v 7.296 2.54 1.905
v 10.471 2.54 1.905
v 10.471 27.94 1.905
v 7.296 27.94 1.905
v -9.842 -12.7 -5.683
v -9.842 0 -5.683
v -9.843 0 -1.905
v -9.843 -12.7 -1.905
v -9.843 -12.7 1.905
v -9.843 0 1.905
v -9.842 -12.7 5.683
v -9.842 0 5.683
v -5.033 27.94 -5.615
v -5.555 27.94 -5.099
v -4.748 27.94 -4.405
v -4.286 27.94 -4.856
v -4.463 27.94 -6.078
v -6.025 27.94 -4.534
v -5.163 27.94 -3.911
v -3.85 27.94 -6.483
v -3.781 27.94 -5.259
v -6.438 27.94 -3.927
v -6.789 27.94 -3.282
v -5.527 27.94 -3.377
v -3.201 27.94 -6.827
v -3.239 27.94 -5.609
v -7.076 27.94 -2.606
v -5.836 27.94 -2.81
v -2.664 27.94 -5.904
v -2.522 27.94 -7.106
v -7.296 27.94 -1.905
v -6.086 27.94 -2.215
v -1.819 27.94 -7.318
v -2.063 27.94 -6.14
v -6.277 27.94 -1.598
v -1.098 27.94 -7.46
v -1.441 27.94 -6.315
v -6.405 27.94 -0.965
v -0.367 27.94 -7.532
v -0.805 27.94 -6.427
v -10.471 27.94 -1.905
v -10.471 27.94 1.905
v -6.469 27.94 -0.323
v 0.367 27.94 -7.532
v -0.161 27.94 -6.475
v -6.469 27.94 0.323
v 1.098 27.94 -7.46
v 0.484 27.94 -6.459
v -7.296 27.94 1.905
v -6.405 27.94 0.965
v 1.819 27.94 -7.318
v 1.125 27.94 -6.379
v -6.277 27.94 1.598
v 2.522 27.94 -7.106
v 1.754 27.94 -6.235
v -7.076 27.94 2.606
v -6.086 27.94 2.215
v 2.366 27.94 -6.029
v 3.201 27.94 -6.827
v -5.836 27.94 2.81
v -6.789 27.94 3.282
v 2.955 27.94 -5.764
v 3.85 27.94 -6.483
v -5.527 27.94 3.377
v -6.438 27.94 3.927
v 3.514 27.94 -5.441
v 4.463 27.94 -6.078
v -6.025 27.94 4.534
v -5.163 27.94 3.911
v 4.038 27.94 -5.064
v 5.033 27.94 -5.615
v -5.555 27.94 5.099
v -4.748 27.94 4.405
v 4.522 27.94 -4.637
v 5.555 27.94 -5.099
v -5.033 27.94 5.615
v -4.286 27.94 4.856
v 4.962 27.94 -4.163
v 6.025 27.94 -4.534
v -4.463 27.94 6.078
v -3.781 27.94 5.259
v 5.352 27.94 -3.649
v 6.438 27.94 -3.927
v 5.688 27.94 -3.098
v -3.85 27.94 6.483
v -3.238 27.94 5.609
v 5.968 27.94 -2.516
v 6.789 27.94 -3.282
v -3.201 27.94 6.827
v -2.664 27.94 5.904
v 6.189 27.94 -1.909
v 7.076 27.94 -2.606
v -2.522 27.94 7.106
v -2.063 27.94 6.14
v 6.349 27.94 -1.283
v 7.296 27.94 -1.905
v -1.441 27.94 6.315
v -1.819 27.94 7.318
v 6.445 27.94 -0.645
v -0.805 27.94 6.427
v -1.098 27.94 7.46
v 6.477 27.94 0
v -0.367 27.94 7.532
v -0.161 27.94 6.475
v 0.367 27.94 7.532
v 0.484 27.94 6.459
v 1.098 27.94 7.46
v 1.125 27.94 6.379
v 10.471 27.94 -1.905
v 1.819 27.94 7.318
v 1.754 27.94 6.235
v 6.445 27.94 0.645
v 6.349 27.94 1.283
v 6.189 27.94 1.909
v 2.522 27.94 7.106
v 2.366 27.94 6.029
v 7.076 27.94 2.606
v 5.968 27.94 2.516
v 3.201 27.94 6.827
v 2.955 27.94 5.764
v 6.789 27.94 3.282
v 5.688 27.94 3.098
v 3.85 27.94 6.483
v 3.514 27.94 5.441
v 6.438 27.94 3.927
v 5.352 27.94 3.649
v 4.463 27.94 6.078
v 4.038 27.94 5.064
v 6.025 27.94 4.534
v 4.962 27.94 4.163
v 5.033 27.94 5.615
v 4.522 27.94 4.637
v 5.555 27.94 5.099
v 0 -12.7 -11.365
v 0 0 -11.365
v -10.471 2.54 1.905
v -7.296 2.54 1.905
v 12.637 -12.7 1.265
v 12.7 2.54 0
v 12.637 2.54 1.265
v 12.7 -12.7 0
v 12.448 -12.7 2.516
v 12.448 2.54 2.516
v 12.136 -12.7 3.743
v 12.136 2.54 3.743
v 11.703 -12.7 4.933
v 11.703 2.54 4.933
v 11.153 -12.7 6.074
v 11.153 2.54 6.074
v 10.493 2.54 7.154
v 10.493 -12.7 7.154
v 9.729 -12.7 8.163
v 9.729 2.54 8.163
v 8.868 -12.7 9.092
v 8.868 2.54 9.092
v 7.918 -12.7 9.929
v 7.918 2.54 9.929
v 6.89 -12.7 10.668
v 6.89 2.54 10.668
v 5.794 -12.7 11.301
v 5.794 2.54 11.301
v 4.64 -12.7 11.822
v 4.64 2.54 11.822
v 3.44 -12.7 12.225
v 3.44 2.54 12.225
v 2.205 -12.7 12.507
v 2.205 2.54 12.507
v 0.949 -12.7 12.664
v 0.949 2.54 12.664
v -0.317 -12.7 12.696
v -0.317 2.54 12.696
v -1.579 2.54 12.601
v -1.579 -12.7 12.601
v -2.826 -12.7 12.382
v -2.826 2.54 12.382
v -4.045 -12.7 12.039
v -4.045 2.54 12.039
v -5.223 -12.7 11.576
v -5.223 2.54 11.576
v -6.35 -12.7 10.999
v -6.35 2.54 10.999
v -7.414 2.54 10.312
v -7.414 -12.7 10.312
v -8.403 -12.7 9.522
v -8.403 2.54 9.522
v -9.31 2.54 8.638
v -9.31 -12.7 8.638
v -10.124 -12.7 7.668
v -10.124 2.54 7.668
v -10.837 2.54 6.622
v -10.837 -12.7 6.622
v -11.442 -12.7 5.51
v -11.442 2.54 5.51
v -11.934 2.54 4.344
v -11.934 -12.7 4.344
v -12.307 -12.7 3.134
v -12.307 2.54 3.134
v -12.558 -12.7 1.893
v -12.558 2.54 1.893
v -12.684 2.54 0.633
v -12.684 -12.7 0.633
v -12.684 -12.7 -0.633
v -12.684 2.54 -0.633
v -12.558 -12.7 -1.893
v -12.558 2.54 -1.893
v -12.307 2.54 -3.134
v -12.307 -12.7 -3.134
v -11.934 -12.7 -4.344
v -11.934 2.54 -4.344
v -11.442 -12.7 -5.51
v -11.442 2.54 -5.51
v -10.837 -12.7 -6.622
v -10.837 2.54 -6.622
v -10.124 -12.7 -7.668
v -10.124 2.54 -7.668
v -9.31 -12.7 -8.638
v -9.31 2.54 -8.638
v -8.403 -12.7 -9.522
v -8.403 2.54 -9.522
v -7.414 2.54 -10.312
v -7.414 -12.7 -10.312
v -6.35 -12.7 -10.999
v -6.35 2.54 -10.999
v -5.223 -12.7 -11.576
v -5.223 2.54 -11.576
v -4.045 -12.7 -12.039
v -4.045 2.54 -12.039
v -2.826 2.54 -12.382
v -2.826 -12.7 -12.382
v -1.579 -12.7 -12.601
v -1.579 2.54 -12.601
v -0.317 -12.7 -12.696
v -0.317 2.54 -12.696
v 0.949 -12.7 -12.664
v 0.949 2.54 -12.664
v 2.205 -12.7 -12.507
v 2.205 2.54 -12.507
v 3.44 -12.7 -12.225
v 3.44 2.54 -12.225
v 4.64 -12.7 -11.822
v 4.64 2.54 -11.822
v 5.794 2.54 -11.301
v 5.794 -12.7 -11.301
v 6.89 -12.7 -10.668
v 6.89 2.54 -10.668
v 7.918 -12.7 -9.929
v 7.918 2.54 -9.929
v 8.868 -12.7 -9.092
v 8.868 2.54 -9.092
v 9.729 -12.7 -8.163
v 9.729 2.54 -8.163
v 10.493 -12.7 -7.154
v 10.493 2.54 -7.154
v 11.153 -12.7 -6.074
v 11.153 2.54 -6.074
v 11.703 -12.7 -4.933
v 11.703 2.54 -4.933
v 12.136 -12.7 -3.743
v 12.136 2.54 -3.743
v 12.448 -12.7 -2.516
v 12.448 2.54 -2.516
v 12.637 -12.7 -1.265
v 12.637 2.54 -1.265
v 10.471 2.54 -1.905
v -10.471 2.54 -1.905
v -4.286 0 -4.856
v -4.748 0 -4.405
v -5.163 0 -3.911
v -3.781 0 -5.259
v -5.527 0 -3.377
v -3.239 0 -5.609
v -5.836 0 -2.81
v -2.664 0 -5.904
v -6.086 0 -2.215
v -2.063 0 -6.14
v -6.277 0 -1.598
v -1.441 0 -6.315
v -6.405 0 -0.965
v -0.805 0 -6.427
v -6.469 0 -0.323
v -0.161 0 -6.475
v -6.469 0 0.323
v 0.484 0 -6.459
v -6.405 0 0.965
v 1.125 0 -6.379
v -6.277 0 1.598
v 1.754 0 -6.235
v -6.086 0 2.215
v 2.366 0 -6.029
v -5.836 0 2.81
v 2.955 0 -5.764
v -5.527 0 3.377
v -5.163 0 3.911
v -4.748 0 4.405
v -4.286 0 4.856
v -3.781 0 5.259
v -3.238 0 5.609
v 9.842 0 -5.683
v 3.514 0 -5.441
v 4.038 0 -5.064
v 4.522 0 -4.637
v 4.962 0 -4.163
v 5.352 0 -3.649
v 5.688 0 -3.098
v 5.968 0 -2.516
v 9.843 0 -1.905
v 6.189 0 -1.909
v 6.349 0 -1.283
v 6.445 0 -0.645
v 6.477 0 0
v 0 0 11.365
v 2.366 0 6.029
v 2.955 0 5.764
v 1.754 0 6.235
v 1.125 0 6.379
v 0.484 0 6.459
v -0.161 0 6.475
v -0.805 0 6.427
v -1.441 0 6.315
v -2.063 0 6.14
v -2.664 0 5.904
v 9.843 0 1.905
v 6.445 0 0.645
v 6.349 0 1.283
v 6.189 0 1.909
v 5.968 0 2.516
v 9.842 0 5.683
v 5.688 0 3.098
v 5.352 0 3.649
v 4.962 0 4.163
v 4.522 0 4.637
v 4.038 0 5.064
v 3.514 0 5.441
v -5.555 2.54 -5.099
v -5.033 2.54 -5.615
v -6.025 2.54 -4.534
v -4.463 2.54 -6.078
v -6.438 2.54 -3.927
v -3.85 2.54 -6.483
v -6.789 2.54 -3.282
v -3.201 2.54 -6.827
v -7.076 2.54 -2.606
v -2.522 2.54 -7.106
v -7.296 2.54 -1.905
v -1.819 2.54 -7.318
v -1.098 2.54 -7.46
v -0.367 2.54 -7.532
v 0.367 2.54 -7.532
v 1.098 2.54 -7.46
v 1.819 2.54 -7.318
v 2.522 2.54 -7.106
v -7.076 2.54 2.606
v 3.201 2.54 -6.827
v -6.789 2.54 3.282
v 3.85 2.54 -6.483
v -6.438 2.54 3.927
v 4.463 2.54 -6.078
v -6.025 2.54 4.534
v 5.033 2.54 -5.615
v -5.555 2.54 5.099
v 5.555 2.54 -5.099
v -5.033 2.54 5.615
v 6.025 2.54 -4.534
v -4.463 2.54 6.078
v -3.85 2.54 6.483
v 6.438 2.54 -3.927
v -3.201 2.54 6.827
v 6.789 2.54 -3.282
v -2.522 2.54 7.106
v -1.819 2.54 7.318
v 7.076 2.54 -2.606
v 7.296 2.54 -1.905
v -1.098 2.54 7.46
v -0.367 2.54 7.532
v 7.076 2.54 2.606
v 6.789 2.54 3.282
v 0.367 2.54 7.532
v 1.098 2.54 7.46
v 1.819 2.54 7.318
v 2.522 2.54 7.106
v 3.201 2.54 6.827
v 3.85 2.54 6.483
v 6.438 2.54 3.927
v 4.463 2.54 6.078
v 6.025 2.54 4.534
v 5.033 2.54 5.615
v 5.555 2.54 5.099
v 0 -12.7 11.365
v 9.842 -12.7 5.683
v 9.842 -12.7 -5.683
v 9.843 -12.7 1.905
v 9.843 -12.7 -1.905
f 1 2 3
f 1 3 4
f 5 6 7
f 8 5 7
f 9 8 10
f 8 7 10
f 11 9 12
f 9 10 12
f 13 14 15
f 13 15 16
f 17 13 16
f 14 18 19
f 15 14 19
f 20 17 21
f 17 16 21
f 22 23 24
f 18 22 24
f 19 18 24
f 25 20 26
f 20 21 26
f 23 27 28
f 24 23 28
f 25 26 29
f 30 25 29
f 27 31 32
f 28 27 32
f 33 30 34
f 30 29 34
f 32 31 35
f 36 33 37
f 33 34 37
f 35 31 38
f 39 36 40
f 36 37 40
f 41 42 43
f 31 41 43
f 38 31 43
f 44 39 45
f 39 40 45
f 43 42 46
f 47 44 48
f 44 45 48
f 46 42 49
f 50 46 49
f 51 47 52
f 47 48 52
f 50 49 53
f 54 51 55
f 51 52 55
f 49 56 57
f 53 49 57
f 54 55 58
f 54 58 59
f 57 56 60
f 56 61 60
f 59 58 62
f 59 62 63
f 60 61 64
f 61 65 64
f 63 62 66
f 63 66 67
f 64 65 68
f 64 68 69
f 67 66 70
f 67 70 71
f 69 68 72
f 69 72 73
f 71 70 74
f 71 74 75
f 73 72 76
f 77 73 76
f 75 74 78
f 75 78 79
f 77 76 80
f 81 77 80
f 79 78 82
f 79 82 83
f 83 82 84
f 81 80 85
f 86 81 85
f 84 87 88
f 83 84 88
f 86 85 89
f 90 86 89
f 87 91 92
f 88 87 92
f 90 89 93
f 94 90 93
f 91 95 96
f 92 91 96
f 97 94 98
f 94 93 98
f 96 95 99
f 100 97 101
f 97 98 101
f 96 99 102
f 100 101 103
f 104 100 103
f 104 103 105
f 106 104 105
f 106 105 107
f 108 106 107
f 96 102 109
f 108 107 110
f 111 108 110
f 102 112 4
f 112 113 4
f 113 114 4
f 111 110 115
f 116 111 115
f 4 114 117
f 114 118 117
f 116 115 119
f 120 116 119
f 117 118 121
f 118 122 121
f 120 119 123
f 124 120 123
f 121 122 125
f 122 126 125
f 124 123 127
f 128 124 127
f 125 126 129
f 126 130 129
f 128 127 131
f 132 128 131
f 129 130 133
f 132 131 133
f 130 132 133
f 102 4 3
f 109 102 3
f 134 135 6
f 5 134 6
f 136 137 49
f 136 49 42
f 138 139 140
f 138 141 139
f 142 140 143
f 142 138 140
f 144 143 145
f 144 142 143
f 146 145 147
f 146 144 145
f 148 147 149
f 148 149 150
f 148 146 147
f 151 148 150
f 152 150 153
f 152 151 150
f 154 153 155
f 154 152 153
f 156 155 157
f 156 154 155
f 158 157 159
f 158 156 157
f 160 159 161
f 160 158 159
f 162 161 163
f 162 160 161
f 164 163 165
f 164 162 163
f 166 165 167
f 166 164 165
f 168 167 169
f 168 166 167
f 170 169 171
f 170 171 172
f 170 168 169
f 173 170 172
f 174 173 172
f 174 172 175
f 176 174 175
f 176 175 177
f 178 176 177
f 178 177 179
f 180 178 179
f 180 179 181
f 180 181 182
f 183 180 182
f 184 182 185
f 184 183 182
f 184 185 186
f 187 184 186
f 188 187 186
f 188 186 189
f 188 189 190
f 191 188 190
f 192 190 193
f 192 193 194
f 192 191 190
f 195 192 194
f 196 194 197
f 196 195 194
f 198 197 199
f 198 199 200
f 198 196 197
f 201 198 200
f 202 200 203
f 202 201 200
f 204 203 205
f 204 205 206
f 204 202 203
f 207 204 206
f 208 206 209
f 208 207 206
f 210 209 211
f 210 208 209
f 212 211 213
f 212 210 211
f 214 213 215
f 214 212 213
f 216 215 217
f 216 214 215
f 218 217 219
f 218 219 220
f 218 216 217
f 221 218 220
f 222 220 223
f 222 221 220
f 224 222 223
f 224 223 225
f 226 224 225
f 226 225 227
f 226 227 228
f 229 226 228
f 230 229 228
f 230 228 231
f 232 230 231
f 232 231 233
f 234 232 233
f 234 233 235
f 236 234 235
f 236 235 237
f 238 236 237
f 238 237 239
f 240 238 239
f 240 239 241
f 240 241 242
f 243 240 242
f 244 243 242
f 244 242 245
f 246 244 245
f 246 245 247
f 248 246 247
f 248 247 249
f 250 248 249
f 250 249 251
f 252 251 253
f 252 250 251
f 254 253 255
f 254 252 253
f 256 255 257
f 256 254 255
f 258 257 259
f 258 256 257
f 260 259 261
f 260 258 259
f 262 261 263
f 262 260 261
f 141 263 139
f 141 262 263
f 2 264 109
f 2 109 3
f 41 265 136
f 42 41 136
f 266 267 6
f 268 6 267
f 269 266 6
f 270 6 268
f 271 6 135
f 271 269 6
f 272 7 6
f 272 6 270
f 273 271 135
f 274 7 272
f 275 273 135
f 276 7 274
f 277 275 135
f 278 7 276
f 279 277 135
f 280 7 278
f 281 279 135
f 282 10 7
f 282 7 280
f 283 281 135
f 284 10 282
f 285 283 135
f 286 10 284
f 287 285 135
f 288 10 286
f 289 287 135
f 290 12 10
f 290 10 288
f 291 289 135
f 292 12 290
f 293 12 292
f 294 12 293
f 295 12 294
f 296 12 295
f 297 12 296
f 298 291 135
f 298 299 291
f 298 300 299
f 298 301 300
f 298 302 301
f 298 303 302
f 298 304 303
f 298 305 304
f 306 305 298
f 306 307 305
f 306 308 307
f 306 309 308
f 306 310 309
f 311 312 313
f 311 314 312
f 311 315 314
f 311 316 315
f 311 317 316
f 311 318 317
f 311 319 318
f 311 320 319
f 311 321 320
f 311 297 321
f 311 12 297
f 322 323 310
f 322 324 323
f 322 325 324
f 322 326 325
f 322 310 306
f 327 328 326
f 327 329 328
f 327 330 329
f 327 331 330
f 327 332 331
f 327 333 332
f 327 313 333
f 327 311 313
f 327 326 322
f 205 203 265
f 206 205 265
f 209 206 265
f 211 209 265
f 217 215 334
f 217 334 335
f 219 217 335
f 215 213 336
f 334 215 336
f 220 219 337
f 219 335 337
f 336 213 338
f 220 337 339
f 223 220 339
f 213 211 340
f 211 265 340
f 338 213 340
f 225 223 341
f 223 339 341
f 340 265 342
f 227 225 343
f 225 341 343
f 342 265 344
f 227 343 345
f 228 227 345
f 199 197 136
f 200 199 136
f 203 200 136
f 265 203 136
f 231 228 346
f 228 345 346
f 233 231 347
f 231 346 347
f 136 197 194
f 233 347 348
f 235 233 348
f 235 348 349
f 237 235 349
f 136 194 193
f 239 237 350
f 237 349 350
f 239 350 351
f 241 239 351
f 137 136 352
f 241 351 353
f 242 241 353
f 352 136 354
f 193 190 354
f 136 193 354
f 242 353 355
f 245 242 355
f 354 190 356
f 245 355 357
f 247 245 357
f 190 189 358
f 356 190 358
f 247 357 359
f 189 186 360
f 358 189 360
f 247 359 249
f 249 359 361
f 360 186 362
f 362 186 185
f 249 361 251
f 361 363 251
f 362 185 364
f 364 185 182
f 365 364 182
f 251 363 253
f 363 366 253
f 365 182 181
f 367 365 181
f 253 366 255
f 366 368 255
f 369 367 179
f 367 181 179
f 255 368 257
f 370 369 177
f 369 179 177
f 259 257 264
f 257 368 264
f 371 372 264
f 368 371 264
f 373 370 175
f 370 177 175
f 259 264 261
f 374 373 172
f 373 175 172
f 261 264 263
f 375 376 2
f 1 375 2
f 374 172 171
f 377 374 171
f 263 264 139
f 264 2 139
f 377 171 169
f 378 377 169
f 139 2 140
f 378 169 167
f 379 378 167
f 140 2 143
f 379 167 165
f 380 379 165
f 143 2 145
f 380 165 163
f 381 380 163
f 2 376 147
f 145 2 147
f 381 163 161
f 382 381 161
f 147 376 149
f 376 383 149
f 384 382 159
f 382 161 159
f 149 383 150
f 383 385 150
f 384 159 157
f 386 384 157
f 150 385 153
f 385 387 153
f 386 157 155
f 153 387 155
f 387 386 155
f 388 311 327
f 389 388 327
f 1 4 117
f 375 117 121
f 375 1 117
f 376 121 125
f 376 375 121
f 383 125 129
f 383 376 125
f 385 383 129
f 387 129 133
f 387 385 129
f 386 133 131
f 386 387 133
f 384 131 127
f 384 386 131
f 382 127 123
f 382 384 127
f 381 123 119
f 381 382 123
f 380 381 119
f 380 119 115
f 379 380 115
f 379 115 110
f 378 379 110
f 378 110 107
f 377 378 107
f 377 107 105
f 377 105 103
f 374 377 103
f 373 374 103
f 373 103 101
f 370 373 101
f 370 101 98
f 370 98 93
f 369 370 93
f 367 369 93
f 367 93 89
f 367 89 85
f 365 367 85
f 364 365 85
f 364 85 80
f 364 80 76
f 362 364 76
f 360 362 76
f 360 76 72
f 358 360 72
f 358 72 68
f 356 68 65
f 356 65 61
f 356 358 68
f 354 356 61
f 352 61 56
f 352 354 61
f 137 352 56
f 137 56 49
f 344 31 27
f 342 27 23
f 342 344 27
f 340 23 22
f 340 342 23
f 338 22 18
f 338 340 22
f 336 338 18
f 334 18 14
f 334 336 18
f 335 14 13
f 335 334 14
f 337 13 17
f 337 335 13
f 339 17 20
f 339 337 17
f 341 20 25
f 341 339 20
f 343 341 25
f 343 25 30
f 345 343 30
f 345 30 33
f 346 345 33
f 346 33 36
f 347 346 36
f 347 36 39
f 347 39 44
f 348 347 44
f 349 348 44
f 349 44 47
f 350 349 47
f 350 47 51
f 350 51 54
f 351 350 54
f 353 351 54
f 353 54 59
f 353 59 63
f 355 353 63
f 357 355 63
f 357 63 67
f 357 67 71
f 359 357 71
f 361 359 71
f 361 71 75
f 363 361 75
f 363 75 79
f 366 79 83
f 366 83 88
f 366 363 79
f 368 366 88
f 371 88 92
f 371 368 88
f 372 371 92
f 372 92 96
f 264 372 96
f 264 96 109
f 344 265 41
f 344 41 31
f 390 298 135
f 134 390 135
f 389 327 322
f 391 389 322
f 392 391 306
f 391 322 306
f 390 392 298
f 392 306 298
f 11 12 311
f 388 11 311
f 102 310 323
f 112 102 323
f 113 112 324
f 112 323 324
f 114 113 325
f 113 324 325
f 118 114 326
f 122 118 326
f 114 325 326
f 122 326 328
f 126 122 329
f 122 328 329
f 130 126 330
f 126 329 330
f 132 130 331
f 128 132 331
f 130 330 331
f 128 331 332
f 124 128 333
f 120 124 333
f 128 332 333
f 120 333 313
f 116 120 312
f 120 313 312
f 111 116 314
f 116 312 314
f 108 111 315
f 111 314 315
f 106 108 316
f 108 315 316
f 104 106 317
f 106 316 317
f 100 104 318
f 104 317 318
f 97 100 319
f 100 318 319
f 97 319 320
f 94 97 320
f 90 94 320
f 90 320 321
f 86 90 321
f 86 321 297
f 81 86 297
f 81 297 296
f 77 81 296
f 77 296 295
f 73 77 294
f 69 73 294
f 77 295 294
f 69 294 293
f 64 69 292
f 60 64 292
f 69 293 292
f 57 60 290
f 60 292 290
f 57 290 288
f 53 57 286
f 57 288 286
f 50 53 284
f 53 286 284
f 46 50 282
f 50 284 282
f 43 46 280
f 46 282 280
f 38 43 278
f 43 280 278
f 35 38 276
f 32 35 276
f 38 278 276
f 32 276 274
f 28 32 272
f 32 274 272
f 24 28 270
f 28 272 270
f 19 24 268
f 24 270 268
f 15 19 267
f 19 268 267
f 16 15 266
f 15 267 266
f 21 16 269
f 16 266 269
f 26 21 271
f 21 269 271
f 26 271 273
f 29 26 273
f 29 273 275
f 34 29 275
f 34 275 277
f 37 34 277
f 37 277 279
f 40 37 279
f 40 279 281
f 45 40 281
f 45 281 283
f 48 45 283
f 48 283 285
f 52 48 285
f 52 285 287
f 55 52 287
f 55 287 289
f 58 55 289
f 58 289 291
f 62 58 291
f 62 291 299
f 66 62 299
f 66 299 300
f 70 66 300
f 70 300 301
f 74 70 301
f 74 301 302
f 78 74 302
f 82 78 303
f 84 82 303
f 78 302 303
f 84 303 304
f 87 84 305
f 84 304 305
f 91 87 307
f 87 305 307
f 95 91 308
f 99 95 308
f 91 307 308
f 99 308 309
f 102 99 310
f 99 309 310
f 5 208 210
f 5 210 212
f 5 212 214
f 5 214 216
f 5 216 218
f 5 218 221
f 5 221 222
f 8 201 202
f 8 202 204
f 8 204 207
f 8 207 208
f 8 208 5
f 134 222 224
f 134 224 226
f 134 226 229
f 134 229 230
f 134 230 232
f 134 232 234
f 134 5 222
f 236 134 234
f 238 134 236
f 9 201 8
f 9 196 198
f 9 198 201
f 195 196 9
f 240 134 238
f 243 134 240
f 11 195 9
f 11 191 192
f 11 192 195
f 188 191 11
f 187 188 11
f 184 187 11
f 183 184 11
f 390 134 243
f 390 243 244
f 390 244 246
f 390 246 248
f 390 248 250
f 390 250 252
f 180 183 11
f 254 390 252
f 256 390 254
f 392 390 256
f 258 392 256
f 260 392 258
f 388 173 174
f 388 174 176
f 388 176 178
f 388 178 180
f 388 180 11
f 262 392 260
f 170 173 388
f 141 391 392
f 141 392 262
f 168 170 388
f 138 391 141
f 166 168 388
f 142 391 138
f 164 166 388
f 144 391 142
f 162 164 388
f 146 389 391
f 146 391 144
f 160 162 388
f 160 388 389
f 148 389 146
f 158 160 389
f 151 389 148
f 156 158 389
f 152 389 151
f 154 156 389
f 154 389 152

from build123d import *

# Parameters (mm, degrees)
F0_R     = 12.7
F0_W     = 0.6285263425
F0_H     = 3.81
F1_DEPTH = 12.7
F2_DEPTH = 2.54
F0_R_2   = 6.477
F3_DEPTH = 27.94


# Not quite as in the source:
# - a feature names something its author has since deleted; it is built from what else it names


with BuildPart() as f1:
    # F0 (on Front) → F1 (new body)
    with BuildSketch(Plane.XZ):
        Circle(F0_R)
        Polygon((9.8425, 5.6825700245), (9.8425, 1.905), (10.4710263425, 1.905), (10.4710263425, -1.905), (9.8425, -1.905), (9.8425, -5.6825700245), (0, -11.365140049), (-9.8425, -5.6825700245), (-9.8425, -1.905), (-10.4710263425, -1.905), (-10.4710263425, 1.905), (-9.8425, 1.905), (-9.8425, 5.6825700245), (0, 11.365140049), align=None, mode=Mode.SUBTRACT)
        with Locations((10.1567631713, 0)):
            Rectangle(F0_W, F0_H)
        with Locations((-10.1567631713, 0)):
            Rectangle(F0_W, F0_H)
    extrude(amount=F1_DEPTH)

    # F0 (on Front) → F2 (join)
    with BuildSketch(Plane.XZ):
        Circle(F0_R)
        Polygon((9.8425, 5.6825700245), (9.8425, 1.905), (10.4710263425, 1.905), (10.4710263425, -1.905), (9.8425, -1.905), (9.8425, -5.6825700245), (0, -11.365140049), (-9.8425, -5.6825700245), (-9.8425, -1.905), (-10.4710263425, -1.905), (-10.4710263425, 1.905), (-9.8425, 1.905), (-9.8425, 5.6825700245), (0, 11.365140049), align=None, mode=Mode.SUBTRACT)
        with BuildLine():
            ThreePointArc((-7.2960263425, 1.905), (0, 7.540625), (7.2960263425, 1.905))
            Line((7.2960263425, 1.905), (9.8425, 1.905))
            Line((9.8425, 1.905), (9.8425, 5.6825700245))
            Line((9.8425, 5.6825700245), (0, 11.365140049))
            Line((0, 11.365140049), (-9.8425, 5.6825700245))
            Line((-9.8425, 5.6825700245), (-9.8425, 1.905))
            Line((-9.8425, 1.905), (-7.2960263425, 1.905))
        make_face()
        with BuildLine():
            Line((9.8425, -1.905), (7.2960263425, -1.905))
            ThreePointArc((7.2960263425, -1.905), (0, -7.540625), (-7.2960263425, -1.905))
            Line((-7.2960263425, -1.905), (-9.8425, -1.905))
            Line((-9.8425, -1.905), (-9.8425, -5.6825700245))
            Line((-9.8425, -5.6825700245), (0, -11.365140049))
            Line((0, -11.365140049), (9.8425, -5.6825700245))
            Line((9.8425, -5.6825700245), (9.8425, -1.905))
        make_face()
    extrude(amount=-F2_DEPTH)

    # F0 (on Front) → F3 (join)
    with BuildSketch(Plane.XZ):
        with BuildLine():
            ThreePointArc((7.2960263425, 1.905), (7.4792253619, 0.9603194134), (7.540625, 0))
            ThreePointArc((7.540625, 0), (7.4792253619, -0.9603194134), (7.2960263425, -1.905))
            Line((7.2960263425, -1.905), (9.8425, -1.905))
            Line((9.8425, -1.905), (9.8425, 1.905))
            Line((9.8425, 1.905), (7.2960263425, 1.905))
        make_face()
        with BuildLine():
            ThreePointArc((7.2960263425, -1.905), (7.4792253619, -0.9603194134), (7.540625, 0))
            ThreePointArc((7.540625, 0), (7.4792253619, 0.9603194134), (7.2960263425, 1.905))
            Line((7.2960263425, 1.905), (7.2960263425, -1.905))
        make_face()
        with BuildLine():
            Line((7.2960263425, -1.905), (7.2960263425, 1.905))
            ThreePointArc((7.2960263425, 1.905), (0, 7.540625), (-7.2960263425, 1.905))
            Line((-7.2960263425, 1.905), (-7.2960263425, -1.905))
            ThreePointArc((-7.2960263425, -1.905), (0, -7.540625), (7.2960263425, -1.905))
        make_face()
        Circle(F0_R_2, mode=Mode.SUBTRACT)
        with BuildLine():
            Line((-7.2960263425, -1.905), (-7.2960263425, 1.905))
            ThreePointArc((-7.2960263425, 1.905), (-7.540625, 0), (-7.2960263425, -1.905))
        make_face()
        with BuildLine():
            ThreePointArc((-7.2960263425, -1.905), (-7.540625, 0), (-7.2960263425, 1.905))
            Line((-7.2960263425, 1.905), (-9.8425, 1.905))
            Line((-9.8425, 1.905), (-9.8425, -1.905))
            Line((-9.8425, -1.905), (-7.2960263425, -1.905))
        make_face()
        with Locations((10.1567631713, 0)):
            Rectangle(F0_W, F0_H)
        with Locations((-10.1567631713, 0)):
            Rectangle(F0_W, F0_H)
    extrude(amount=-F3_DEPTH)


solid = f1.part
